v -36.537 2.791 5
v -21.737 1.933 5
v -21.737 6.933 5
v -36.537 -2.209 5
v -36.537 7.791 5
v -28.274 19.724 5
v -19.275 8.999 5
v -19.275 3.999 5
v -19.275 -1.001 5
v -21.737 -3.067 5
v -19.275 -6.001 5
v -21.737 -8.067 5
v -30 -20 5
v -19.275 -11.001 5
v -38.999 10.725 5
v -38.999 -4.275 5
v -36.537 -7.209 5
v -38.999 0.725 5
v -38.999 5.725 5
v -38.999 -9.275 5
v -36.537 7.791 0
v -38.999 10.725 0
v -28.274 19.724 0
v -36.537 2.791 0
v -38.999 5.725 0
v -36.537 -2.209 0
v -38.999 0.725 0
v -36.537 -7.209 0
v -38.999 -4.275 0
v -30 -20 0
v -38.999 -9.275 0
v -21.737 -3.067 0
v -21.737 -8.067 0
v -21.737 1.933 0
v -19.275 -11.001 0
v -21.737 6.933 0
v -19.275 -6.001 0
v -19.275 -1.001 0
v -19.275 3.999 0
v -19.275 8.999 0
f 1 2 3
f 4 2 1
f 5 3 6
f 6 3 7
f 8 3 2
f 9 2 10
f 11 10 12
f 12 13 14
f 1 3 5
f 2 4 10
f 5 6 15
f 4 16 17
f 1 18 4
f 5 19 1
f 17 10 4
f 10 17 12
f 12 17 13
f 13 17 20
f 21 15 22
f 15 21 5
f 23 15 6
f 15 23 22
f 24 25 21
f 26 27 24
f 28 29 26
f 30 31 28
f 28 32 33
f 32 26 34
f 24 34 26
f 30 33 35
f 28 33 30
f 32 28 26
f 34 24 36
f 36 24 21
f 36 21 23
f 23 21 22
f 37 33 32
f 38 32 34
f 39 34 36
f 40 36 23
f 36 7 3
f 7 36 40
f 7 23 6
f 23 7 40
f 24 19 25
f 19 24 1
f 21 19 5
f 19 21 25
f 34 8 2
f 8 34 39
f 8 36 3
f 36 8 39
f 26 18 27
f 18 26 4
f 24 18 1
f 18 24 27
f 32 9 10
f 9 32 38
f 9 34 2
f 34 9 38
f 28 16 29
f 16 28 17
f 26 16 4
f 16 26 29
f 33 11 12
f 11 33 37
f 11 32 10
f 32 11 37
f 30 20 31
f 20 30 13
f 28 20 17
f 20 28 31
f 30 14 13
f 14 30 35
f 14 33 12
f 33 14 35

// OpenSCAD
for (i = [0 : 4 ] ) {

translate([-30,i *-5,0])
rotate([0,0,40])
cube([14,14,5]);

}
